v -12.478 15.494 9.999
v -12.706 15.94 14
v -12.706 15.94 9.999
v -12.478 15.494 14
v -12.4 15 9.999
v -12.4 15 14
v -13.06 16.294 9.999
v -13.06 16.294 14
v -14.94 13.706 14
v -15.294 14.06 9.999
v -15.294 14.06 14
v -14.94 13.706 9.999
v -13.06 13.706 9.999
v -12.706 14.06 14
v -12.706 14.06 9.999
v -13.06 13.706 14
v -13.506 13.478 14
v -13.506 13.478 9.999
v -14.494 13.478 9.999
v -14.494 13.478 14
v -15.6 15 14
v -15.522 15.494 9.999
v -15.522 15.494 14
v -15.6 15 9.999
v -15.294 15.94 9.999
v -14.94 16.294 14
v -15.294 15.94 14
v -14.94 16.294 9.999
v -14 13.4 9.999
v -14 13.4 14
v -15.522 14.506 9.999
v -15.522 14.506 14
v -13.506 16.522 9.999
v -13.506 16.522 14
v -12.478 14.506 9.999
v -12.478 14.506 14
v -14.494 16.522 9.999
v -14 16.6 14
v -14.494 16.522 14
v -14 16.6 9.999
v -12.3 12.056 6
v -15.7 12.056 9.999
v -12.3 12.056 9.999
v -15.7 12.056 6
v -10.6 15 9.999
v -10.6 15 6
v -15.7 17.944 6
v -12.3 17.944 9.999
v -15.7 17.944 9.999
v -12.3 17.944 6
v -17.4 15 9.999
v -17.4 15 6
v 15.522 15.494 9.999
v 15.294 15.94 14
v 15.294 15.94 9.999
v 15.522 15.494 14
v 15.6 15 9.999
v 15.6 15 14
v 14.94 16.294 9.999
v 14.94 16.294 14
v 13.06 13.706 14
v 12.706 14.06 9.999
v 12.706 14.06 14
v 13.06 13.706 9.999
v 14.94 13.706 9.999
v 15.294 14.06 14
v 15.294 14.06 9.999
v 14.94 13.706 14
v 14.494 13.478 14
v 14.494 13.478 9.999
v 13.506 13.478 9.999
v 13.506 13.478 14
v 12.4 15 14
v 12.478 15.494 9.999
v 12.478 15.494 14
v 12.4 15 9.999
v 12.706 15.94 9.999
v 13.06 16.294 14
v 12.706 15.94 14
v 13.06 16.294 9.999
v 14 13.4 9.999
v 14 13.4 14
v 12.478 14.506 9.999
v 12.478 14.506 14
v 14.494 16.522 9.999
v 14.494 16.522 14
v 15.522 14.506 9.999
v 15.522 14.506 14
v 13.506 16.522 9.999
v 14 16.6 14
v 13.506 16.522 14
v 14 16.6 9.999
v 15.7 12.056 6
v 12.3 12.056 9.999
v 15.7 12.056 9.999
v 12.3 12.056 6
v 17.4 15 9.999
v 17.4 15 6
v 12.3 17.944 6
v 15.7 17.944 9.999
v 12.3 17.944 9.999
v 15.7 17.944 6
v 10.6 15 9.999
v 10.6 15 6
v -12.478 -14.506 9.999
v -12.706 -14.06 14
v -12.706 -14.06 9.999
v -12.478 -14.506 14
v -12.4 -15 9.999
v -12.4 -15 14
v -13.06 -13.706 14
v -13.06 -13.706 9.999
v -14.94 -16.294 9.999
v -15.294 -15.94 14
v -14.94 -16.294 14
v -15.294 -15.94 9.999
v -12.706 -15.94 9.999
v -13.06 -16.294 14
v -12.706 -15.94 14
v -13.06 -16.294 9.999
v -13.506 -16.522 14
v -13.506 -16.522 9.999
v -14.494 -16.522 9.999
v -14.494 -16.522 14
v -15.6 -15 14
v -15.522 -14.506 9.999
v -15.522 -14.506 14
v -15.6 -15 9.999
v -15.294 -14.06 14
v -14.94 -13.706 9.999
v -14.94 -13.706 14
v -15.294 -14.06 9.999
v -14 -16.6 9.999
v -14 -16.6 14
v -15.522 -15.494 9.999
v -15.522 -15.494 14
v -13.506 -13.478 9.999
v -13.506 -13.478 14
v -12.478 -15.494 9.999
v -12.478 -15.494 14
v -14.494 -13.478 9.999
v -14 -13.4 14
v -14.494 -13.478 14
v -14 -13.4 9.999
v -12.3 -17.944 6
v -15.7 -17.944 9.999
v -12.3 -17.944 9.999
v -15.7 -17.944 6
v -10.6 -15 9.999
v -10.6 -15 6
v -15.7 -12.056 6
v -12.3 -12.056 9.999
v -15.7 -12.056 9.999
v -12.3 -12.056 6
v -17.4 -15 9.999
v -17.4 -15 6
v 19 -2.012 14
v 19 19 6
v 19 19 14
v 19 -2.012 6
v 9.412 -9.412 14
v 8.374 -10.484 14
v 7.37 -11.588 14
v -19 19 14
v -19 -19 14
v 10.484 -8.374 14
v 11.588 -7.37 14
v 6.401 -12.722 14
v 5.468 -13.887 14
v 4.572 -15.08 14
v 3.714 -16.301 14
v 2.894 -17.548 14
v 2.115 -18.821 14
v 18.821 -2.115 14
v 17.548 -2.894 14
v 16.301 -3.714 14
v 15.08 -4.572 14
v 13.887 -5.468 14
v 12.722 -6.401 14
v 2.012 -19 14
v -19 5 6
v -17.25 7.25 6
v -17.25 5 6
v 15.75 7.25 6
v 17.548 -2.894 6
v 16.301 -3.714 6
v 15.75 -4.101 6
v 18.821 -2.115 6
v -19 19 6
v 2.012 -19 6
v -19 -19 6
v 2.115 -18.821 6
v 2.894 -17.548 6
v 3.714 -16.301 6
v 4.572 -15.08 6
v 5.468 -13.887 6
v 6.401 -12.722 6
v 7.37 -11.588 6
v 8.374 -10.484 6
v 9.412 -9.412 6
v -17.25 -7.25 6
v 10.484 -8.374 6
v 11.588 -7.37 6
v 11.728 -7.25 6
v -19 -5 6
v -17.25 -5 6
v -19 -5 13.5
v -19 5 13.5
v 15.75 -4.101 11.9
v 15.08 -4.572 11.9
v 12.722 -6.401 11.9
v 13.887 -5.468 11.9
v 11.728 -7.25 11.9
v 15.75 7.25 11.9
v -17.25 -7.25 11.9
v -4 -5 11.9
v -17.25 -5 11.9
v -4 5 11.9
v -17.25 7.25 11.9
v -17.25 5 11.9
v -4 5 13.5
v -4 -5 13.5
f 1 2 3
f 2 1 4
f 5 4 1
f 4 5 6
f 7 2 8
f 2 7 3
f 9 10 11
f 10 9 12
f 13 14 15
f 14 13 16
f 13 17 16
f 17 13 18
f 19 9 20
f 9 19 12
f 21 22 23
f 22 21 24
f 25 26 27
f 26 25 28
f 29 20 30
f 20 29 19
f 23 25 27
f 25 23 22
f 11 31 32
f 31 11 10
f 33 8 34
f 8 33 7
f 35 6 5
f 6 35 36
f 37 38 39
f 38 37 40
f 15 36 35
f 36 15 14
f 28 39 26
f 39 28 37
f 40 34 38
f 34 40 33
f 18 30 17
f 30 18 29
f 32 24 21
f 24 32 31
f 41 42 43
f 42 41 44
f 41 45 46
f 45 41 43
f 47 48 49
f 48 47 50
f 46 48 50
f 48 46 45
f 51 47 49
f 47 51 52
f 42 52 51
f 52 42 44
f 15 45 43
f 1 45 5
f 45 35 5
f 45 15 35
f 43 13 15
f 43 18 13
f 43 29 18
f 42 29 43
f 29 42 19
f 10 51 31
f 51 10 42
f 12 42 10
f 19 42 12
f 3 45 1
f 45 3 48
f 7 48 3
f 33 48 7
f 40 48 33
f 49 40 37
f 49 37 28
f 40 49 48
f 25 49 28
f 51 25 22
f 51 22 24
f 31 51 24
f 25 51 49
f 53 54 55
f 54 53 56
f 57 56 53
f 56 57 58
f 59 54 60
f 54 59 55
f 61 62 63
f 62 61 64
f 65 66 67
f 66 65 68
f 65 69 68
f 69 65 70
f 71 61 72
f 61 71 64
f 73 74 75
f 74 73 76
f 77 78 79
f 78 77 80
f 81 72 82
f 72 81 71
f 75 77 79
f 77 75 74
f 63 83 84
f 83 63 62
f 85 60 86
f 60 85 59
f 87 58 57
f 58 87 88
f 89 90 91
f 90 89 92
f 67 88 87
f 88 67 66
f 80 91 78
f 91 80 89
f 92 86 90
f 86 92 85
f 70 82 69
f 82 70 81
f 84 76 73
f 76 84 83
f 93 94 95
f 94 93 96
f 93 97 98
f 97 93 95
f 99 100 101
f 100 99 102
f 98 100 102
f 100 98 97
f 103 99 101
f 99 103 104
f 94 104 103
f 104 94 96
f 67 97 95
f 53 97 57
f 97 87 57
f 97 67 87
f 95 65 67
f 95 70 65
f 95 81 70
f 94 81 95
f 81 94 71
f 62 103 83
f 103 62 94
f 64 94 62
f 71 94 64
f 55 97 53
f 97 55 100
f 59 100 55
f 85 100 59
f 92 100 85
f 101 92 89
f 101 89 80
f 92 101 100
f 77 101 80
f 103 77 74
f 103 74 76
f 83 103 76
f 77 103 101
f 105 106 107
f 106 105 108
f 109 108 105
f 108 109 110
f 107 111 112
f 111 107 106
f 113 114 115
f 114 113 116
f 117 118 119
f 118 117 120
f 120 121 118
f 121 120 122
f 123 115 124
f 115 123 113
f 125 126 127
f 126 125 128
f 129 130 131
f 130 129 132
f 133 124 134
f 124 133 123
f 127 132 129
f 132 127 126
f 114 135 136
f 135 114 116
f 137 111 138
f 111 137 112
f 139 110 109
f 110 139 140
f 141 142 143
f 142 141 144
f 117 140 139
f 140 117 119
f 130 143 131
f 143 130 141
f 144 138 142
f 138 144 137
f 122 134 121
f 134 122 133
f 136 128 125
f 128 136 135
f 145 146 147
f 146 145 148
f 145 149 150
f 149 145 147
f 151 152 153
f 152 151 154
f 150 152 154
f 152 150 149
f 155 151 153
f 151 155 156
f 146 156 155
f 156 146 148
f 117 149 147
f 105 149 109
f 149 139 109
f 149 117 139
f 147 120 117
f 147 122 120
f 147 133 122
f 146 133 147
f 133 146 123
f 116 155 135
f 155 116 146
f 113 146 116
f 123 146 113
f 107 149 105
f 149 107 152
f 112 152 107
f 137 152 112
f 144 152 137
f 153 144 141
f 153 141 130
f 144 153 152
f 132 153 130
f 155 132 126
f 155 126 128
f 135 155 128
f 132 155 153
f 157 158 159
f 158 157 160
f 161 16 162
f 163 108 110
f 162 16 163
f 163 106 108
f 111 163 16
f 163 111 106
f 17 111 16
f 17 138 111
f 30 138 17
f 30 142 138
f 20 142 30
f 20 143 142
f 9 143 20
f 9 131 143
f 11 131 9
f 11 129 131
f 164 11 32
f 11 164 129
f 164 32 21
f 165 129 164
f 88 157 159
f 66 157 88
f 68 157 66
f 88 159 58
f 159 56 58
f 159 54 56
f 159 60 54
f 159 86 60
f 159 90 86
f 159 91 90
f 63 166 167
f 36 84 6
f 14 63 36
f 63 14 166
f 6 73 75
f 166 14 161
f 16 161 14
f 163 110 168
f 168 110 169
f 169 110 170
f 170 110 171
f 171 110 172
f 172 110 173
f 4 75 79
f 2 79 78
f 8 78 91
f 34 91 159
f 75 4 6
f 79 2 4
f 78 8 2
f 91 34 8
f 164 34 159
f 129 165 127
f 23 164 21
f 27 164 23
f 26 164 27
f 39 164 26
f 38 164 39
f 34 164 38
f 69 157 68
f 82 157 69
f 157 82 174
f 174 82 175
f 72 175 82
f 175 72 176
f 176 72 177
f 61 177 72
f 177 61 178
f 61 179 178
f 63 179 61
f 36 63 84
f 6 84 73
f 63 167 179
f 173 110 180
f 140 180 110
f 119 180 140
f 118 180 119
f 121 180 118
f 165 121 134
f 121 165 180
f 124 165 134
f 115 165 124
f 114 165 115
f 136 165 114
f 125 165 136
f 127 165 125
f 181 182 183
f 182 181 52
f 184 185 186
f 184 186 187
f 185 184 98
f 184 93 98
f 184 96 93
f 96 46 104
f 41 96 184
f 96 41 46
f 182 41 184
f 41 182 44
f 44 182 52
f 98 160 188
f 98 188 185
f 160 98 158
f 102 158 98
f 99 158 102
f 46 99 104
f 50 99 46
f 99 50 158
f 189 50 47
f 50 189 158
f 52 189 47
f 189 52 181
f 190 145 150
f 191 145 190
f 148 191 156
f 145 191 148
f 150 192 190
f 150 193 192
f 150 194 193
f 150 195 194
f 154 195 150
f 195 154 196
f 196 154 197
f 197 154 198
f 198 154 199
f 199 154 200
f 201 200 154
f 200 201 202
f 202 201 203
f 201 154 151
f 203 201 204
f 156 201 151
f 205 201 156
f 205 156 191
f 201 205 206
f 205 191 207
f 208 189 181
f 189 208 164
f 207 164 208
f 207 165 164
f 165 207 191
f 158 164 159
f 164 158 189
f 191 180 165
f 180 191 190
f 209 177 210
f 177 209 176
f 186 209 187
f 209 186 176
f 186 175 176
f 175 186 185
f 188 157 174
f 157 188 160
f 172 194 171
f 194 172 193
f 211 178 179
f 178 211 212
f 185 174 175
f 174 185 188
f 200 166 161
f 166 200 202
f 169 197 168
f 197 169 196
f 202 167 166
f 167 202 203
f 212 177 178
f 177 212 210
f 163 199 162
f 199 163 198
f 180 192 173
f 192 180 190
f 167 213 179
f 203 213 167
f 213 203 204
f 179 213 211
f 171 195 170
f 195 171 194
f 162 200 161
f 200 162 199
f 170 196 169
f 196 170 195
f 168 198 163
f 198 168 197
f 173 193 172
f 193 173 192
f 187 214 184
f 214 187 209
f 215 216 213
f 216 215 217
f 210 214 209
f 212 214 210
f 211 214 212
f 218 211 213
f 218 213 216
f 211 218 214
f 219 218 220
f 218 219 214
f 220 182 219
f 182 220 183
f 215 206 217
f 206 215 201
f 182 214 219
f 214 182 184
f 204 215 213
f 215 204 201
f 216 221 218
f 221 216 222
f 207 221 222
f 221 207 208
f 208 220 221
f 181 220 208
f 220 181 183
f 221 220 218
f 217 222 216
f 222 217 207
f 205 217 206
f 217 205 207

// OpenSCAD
width = 38;
height = 38;
baseDepth = 6;
lidDepth = 8;
ridgeTopWidth = 7;
ridgeBottomWidth = 10;
ridgeSpacing = 15;
ridgeHeight = 1.5;
mainHoleSpacing = 30;
thirdHoleSpacing = 25;
mountingHoleDistanceFromEdge = 5;

sensorMountingHole = 10;
sensorHoleCenter = 12.5; 
sensorWidth = 6.5;
sensorHeight = 11;

pulleyRadius = 52;
pulleyX = 43;
pulleyY = 43;

$fn = 20;

delta = 0;

module mountingHole(lid)
{
    cylinder(r = 1.6, h = 100, center = true);
    
    if (lid)
    {
        translate([0, 0, baseDepth + 1.999])
            cylinder(r = 3.4, h = 4, $fn = 6, center = true);
    
    }
    else
    {
        translate([0, 0, baseDepth + 2.001])
            cylinder(r = 3.4, h = 4, $fn = 6, center = true);
    }
}

module holes(lid)
{
    translate([-width / 2, 0, 0])
    {
        translate([mountingHoleDistanceFromEdge, mainHoleSpacing / 2, 0])
        {
            mountingHole(lid);
        }

        translate([width - mountingHoleDistanceFromEdge, mainHoleSpacing / 2, 0])
        {
            mountingHole(lid);
        }

        translate([mountingHoleDistanceFromEdge, -mainHoleSpacing / 2, 0])
        {
            mountingHole(lid);
        }
    }
}

module ridge()
{
    translate([-25, 0, -0.001])
    {
        rotate([0, 0, 90])
        rotate([90, 0 ,0])
        {
            linear_extrude(width + 10)
            {
                ridgeProfile =
                [
                    [-ridgeBottomWidth / 2, 0], 
                    [ridgeBottomWidth / 2, 0], 
                    [ridgeTopWidth / 2, ridgeHeight], 
                    [-ridgeTopWidth / 2, ridgeHeight]
                ];
                
                polygon(points=ridgeProfile);
            }
            //cube([width * 3, ridgeWidth, ridgeDepth], center=true);
        }
    }
}

module ridges()
{
    translate([0, ridgeSpacing / 2, 0])
    {
        ridge();
    }

    translate([0, -ridgeSpacing / 2, 0])
    {
        ridge();
    }
    
    translate([0, -ridgeSpacing - ridgeSpacing / 2, 0])
    {
        ridge();
    }
}

module pinTrench()
{
    translate ([-14.5, 0, baseDepth])
    {
        cube([4, 10, 4], center = true);
    }
}

module pulley()
{
    translate([pulleyX, -pulleyY, (-baseDepth/2) +2])
    {
        cylinder(r1 = pulleyRadius , r2 = pulleyRadius - 5, h = baseDepth+1, $fn=200);
        cylinder(r = pulleyRadius -4.5, h = baseDepth + lidDepth + 20, $fn=200);
    }
}

module base()
{
    difference()
    {
        union()
        {
            //pinTrench();            
            //pulley();
            
            difference()
            {
                translate([0, 0, baseDepth / 2])
                {
                    cube([width, height, baseDepth], center = true);
                }
                holes(false);
            }
        }
    
        // Sensor mounting hole    
        translate([-(width / 2) + sensorMountingHole, 0, 1.999])
        {
            cylinder(r = 1.6, h = 100, center = true);
            cylinder(r = 3.4, h = 4, $fn = 6, center = true);
        }
        
        pinTrench();      // 
        ridges();//
        
        translate([sensorHoleCenter, 0, 10])//
        {
            cube([sensorWidth, sensorHeight, 40], center = true);
        }
        
        pulley();//
    }
}

module lid()
{
    difference()
    {
        union()
        {   
            difference()
            {
                translate([0, 0, (lidDepth / 2) + baseDepth])
                {
                    cube([width, height, lidDepth], center = true);
                }
                holes(true);
            }
        }

        rightEdge = sensorHoleCenter + sensorWidth / 2;
        boardWidth = 33;
        position = rightEdge - (boardWidth / 2);
        translate([position, 0, 8.4])
        {
            cube([boardWidth, 14.5, 7], center = true);
        }

        translate([-width / 2, 0, baseDepth + 2])
        {
            cube([30, 10, 11], center = true);
        }

        pulley();
    }
}

//ridges();
//base();
lid();
